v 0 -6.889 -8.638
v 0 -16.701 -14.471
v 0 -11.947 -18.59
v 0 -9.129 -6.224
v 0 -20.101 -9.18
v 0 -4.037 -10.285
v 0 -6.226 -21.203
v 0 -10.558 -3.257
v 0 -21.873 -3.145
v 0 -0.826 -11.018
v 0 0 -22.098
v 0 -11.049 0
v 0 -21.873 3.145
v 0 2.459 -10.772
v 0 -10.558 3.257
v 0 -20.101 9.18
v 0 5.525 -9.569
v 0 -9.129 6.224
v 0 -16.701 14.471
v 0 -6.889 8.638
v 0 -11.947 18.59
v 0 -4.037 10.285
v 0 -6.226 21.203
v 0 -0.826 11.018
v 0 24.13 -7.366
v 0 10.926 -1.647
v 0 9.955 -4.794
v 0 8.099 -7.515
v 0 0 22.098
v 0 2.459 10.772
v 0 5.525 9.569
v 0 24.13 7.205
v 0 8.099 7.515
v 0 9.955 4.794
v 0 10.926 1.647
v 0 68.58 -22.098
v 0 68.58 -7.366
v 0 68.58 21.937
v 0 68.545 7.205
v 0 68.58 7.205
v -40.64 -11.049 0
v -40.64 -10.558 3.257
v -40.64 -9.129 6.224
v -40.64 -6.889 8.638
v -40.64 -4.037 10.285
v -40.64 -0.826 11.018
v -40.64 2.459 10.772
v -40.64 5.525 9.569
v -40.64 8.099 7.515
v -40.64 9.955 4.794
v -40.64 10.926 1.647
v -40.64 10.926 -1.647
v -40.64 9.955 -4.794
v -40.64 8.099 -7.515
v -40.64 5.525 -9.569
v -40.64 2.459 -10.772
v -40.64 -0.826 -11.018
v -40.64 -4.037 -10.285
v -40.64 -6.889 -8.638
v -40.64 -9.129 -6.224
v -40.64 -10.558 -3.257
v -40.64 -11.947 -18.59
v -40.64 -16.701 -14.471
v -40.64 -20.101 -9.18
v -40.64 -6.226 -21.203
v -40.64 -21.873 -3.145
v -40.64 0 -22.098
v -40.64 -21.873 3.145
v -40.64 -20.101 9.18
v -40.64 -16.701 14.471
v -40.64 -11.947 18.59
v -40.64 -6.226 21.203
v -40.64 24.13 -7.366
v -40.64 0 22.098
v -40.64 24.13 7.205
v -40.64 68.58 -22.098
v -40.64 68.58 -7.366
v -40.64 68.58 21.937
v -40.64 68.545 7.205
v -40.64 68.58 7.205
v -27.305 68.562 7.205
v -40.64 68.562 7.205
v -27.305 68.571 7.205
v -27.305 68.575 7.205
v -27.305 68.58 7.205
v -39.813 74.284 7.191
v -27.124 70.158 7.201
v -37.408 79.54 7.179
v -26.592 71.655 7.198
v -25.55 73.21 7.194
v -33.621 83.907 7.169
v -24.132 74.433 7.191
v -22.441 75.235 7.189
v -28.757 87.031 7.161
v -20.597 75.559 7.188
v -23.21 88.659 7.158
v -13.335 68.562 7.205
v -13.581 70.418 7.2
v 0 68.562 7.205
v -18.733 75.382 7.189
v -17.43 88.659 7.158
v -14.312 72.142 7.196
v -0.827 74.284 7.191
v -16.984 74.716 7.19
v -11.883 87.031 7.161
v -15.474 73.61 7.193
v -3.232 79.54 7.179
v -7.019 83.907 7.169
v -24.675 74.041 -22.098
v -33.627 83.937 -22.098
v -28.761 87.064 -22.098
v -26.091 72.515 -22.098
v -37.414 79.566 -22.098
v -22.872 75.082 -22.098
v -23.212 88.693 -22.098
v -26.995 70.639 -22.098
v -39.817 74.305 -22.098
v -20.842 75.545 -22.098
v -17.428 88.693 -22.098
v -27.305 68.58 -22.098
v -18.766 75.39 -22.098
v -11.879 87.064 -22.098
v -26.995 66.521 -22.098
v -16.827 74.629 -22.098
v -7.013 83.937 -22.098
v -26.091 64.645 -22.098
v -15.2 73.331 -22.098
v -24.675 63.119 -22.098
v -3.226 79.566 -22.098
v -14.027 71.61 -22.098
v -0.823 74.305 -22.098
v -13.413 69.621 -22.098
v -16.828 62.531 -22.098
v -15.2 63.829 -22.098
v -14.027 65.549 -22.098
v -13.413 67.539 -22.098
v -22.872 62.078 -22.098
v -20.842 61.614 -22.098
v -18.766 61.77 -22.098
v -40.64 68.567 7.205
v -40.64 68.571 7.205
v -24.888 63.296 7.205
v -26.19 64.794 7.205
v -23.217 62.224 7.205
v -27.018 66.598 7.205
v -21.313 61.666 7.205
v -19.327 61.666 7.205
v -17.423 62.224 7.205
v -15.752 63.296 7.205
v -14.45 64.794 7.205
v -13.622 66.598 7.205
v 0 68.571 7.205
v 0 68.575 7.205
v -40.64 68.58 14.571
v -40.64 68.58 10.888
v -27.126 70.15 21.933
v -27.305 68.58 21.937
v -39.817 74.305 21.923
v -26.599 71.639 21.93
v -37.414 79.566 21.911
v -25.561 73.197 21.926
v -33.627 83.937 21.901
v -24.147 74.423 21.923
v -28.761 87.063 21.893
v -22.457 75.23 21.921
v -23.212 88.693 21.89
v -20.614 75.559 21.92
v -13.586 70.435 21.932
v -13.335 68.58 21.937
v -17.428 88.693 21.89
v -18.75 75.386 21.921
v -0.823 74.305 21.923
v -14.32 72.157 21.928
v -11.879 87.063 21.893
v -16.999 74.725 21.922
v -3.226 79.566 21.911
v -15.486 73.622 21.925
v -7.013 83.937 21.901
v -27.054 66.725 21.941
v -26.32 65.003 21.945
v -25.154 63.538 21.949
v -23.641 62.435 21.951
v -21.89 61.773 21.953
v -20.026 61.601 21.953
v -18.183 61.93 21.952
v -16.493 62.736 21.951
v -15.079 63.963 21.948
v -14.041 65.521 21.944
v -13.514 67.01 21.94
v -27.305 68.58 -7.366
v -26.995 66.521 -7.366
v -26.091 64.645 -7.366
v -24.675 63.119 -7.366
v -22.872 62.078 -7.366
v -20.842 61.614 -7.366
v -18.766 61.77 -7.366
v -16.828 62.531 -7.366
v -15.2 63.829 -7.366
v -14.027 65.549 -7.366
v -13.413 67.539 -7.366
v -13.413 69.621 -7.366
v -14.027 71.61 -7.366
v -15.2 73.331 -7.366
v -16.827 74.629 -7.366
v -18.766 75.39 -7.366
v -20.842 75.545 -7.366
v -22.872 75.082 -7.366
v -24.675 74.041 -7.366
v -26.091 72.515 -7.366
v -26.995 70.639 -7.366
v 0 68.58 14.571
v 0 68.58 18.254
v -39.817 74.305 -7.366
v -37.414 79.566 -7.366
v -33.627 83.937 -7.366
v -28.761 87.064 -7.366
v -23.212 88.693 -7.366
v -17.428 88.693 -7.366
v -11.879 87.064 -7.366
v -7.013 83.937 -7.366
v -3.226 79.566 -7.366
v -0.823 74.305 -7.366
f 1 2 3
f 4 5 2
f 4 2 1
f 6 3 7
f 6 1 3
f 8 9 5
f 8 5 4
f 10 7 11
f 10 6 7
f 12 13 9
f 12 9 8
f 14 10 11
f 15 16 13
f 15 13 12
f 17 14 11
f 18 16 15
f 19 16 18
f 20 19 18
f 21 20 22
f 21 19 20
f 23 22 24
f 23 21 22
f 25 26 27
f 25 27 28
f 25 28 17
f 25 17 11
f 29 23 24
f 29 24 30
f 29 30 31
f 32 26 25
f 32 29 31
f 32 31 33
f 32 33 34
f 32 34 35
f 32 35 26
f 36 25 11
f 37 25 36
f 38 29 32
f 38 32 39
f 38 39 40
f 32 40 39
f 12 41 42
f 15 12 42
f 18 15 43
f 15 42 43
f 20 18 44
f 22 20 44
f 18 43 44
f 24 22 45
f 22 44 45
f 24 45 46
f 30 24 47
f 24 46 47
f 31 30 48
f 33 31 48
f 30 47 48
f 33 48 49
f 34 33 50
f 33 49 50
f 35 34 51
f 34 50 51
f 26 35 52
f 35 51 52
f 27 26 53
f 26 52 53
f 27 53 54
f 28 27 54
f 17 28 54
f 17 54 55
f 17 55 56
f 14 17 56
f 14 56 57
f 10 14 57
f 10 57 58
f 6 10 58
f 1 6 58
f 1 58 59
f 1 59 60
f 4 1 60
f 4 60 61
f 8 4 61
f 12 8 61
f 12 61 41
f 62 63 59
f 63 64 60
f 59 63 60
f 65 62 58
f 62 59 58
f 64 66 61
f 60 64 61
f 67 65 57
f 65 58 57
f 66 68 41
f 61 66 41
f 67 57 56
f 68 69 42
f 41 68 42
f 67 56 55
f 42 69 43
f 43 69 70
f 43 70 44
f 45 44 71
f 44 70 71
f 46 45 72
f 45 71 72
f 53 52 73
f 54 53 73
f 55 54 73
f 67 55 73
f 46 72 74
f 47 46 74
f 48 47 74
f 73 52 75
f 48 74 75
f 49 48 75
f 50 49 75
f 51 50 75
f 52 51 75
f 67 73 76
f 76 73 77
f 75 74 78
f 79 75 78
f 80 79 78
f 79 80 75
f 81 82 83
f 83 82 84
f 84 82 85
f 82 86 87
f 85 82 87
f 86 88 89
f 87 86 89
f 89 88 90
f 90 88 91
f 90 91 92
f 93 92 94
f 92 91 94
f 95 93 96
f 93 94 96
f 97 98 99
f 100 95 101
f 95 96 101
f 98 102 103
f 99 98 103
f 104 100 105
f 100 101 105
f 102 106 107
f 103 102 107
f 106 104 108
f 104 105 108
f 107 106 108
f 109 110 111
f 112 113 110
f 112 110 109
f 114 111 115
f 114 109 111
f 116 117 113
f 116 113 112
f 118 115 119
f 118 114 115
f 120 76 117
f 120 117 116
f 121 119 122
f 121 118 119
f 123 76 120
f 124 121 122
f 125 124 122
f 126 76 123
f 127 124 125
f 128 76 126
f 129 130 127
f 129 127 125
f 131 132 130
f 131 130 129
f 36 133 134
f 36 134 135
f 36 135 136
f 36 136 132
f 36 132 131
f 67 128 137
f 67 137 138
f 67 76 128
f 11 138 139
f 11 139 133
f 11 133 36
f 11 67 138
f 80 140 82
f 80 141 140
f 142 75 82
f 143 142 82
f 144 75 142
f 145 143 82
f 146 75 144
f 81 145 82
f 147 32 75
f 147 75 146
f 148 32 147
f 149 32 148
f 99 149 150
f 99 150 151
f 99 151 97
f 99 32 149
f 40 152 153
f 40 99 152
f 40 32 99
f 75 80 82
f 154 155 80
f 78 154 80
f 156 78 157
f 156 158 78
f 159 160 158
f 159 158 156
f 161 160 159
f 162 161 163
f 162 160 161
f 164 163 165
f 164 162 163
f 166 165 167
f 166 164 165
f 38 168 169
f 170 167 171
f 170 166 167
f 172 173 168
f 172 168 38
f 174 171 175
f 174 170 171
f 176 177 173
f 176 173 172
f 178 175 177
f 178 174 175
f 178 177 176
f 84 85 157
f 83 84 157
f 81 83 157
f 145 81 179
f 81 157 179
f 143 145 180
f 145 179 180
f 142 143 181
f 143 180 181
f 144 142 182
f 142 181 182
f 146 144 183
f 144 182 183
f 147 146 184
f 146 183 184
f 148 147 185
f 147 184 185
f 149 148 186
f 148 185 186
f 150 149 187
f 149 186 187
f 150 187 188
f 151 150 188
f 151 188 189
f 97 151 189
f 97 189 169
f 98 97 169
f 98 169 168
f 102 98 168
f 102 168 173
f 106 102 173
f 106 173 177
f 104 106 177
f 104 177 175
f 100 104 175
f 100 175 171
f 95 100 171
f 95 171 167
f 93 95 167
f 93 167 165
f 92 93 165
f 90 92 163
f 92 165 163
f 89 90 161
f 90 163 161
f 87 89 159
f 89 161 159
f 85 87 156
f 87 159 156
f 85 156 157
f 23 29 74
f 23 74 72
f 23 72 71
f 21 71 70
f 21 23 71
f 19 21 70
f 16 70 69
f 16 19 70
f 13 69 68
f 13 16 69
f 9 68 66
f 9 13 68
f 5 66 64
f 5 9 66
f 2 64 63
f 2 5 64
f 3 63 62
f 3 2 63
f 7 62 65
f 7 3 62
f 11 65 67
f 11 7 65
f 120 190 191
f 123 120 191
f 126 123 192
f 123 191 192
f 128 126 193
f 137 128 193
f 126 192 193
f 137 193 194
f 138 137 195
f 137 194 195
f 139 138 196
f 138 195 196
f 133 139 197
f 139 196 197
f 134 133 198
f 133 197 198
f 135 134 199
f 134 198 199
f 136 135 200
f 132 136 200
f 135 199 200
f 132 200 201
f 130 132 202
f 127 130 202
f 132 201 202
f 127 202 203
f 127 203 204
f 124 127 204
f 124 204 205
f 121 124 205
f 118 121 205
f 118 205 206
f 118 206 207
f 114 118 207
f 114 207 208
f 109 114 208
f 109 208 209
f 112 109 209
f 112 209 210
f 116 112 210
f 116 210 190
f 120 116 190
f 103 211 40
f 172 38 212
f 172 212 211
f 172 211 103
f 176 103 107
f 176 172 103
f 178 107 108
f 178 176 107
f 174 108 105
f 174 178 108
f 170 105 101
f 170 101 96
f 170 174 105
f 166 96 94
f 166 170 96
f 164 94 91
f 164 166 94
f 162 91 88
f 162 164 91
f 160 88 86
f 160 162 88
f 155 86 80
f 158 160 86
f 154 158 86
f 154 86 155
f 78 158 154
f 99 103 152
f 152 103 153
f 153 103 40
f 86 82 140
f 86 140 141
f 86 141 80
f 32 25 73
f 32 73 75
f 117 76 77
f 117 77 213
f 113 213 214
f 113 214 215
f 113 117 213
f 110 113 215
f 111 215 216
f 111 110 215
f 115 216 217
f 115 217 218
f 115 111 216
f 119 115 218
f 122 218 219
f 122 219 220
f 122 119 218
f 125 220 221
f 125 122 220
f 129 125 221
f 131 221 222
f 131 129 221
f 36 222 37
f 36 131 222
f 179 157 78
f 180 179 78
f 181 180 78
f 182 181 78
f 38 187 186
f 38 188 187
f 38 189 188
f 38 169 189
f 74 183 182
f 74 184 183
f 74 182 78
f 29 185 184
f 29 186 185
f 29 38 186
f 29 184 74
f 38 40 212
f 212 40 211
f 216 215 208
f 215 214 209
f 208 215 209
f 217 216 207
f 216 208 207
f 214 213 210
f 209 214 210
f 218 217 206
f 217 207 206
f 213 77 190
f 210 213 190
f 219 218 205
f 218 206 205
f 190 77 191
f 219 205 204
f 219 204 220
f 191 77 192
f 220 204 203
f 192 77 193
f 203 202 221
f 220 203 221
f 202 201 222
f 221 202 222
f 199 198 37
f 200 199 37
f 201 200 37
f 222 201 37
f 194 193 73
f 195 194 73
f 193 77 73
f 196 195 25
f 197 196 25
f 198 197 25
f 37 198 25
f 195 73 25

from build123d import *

# Parameters (mm, degrees)
F1_DEPTH = 40.64
F3_D     = 22.098
F5_DEPTH = 14.732
F7_DEPTH = 14.732
F9_D     = 13.97


with BuildPart() as f1:
    # F0 (on Right) → F1 (new body)
    with BuildSketch(Plane.YZ):
        with BuildLine():
            Line((68.5798105303, 21.9367931967), (0, 22.098))
            ThreePointArc((0, 22.098), (-22.098, 0), (0, -22.098))
            Line((0, -22.098), (68.5798105303, -22.098))
            Line((68.5798105303, -22.098), (68.5798105303, -7.366))
            Line((68.5798105303, -7.366), (24.1298105303, -7.366))
            Line((24.1298105303, -7.366), (24.1298105303, 7.2047931967))
            Line((24.1298105303, 7.2047931967), (68.5798105303, 7.2047931967))
            Line((68.5798105303, 7.2047931967), (68.5798105303, 21.9367931967))
        make_face()
    extrude(amount=-F1_DEPTH)

    # F3 (through all)
    with Locations(Plane.YZ):
        with Locations((0, 0)):
            Hole(F3_D / 2)

    # F4 (on face) → F5 (join)
    with BuildSketch(Plane(origin=(0, 0.0519442709, 22.0978778974), x_dir=(1, 0, 0), z_dir=(0, 0.0023506387, 0.9999972372))):
        with BuildLine():
            Line((-40.64, 68.5280555856), (0, 68.5280555856))
            ThreePointArc((0, 68.5280555856), (-20.32, 88.8480555856), (-40.64, 68.5280555856))
        make_face()
    extrude(amount=-F5_DEPTH)

    # F6 (on face) → F7 (join)
    with BuildSketch(Plane(origin=(0, 0, -22.098), x_dir=(1, 0, 0), z_dir=(0, 0, -1))):
        with BuildLine():
            ThreePointArc((-40.64, -68.5798105303), (-20.32, -88.8998105303), (0, -68.5798105303))
            Line((0, -68.5798105303), (-40.64, -68.5798105303))
        make_face()
    extrude(amount=-F7_DEPTH)

    # F9 (through all)
    with Locations(Plane(origin=(0, 0, -22.098), x_dir=(1, 0, 0), z_dir=(0, 0, -1))):
        with Locations((-20.32, -68.5798105303)):
            Hole(F9_D / 2)


solid = f1.part
